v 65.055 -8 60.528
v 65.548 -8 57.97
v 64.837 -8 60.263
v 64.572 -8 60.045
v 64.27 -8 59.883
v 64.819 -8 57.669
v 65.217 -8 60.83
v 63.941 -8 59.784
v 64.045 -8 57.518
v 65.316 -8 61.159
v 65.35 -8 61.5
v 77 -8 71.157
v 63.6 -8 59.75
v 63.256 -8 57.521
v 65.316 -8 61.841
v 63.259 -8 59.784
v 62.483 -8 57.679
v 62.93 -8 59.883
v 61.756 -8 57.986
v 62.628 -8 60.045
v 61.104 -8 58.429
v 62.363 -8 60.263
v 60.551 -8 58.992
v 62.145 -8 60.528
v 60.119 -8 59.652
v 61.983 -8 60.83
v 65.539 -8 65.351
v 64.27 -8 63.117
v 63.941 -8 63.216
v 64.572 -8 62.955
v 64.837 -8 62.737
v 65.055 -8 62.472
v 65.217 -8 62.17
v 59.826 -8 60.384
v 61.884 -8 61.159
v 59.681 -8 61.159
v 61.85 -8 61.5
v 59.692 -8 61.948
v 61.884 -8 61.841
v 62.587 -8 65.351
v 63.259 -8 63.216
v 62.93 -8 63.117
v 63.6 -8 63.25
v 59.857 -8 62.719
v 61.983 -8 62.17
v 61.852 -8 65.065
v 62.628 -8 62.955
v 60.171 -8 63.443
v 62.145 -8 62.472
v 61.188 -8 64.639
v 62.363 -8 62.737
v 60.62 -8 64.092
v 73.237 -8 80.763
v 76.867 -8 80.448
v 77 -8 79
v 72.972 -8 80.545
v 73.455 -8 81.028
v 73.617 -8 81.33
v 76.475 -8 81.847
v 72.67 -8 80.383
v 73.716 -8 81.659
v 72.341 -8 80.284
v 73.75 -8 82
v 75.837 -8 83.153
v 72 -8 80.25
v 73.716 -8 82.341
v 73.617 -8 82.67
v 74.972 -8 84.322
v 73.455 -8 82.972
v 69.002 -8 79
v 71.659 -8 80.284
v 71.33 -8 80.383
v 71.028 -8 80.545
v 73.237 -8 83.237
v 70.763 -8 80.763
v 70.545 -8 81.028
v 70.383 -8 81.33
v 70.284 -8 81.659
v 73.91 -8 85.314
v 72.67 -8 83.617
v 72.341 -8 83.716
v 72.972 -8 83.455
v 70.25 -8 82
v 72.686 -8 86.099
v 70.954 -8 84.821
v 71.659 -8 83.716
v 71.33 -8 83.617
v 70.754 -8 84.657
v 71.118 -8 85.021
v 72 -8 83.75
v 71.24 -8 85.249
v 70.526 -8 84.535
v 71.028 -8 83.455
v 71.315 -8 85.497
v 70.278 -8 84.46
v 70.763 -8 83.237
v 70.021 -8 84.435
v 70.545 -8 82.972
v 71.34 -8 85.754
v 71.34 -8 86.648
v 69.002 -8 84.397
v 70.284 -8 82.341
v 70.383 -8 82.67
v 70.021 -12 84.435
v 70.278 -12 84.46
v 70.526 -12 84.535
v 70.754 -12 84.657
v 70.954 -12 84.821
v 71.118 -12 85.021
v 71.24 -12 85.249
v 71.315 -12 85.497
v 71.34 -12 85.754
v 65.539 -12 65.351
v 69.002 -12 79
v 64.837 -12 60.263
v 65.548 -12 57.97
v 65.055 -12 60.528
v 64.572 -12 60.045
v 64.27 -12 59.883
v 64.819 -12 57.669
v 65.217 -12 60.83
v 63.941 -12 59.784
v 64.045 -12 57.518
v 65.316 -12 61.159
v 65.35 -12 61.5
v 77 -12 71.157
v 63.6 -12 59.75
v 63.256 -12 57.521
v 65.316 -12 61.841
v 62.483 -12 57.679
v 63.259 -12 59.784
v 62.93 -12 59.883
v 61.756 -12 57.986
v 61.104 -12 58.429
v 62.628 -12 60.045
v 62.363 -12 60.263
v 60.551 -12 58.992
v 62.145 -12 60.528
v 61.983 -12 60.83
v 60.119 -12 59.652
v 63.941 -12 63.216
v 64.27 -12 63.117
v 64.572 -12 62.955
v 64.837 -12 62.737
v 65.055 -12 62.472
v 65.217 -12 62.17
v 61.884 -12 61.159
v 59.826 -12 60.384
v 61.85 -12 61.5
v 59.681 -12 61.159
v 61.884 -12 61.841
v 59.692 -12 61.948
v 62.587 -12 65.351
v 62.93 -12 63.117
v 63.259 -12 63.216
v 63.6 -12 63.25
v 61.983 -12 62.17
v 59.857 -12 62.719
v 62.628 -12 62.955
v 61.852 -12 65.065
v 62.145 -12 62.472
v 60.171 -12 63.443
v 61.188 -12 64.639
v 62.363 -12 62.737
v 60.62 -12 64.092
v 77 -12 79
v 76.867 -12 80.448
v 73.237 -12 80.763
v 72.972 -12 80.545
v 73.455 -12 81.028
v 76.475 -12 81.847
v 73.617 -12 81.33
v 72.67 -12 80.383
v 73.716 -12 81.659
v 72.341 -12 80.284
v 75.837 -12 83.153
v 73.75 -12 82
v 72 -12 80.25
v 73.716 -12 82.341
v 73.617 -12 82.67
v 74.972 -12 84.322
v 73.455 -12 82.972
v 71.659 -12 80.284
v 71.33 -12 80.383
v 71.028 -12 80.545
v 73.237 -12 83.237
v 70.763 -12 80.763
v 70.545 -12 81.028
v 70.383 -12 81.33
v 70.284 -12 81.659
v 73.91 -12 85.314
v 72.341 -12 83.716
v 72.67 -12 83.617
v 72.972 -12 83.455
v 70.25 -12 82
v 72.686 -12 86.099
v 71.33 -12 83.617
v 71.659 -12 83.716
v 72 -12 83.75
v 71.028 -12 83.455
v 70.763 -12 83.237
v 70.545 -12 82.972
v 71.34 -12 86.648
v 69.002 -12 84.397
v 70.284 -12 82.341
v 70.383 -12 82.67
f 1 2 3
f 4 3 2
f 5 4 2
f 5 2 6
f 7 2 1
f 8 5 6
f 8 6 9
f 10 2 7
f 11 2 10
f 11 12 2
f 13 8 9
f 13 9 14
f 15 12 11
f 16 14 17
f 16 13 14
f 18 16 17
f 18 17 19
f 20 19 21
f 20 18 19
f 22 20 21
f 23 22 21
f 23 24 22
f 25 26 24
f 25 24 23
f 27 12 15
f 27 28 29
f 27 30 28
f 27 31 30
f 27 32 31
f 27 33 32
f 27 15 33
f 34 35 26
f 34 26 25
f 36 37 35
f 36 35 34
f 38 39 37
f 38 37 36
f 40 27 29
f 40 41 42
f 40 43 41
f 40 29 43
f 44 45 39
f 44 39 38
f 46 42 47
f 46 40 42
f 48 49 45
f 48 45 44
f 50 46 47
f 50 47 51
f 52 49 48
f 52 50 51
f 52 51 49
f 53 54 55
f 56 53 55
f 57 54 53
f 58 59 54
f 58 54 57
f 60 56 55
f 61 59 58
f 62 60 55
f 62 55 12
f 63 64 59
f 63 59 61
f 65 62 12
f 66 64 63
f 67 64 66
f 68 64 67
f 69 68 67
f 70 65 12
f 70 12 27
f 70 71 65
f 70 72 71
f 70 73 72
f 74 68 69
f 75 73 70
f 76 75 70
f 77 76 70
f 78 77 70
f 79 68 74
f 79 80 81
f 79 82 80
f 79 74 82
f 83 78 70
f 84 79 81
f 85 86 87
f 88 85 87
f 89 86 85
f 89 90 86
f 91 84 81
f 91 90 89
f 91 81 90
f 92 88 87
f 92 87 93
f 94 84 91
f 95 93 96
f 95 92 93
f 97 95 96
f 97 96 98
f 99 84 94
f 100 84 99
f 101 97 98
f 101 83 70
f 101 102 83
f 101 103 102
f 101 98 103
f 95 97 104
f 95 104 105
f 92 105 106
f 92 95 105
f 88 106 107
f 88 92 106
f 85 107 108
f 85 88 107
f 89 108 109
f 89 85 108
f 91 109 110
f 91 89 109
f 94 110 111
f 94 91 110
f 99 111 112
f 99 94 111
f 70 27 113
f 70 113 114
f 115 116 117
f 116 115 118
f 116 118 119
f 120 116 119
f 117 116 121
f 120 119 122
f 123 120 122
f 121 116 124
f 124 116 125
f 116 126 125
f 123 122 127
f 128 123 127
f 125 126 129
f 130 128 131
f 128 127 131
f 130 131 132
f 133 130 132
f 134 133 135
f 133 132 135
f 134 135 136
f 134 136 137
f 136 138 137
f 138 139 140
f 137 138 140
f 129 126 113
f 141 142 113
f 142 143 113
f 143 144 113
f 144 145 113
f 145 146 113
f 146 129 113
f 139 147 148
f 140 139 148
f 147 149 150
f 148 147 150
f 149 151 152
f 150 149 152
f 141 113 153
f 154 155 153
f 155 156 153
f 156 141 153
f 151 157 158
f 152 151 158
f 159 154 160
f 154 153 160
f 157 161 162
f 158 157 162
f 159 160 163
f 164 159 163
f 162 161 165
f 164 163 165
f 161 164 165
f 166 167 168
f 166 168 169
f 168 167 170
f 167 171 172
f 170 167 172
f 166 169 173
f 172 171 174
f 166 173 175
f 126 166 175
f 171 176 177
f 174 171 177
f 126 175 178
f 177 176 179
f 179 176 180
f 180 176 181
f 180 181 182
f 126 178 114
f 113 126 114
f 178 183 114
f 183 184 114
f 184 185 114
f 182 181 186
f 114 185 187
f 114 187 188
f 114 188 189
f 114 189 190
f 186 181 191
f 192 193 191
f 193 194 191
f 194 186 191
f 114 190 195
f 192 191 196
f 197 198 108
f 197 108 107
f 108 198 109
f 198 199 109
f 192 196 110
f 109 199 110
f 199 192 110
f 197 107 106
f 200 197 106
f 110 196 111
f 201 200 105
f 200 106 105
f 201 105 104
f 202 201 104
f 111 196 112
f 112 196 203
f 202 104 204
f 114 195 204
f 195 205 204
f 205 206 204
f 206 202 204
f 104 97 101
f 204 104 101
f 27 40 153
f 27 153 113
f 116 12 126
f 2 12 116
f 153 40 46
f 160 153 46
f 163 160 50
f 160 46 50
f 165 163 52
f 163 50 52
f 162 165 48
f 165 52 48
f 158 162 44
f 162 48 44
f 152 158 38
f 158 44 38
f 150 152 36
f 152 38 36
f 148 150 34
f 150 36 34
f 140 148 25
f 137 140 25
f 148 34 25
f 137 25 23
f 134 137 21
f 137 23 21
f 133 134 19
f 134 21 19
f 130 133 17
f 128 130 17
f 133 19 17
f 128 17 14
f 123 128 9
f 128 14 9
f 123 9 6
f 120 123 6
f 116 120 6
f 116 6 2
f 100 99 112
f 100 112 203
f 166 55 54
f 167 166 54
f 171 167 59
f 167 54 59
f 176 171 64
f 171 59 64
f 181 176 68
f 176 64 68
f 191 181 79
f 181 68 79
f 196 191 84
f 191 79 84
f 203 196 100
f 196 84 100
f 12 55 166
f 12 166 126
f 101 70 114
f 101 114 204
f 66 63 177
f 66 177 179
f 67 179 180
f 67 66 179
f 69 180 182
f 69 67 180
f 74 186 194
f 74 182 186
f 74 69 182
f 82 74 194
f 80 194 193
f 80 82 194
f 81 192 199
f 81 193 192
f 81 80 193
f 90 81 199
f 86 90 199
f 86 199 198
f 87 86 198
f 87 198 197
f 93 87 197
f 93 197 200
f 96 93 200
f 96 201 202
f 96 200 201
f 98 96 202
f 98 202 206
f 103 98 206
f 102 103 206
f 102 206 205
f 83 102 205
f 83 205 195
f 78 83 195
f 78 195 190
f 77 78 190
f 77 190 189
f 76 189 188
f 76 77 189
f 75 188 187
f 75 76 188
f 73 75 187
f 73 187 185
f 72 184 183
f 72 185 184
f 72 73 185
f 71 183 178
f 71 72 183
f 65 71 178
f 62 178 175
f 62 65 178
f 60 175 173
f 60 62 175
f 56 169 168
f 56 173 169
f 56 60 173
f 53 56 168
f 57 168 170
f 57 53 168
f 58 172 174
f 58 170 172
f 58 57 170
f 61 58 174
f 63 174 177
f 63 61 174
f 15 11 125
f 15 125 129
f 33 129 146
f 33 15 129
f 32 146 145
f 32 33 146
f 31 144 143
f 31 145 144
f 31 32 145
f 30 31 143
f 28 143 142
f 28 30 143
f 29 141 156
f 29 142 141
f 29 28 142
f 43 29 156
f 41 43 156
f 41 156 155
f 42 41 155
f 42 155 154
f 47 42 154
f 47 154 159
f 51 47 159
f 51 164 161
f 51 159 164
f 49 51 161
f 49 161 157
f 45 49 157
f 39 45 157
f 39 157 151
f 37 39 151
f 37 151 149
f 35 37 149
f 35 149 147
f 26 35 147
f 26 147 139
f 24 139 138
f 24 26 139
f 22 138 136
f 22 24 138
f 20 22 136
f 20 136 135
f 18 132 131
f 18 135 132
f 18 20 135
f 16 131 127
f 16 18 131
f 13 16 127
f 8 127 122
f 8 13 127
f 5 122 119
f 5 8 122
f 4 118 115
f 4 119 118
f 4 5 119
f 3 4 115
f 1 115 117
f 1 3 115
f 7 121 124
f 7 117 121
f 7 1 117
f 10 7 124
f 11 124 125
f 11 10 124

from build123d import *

# Parameters (mm, degrees)
CYLINDER056_R     = 1.75
CYLINDER056_DEPTH = 15
CYLINDER049_R     = 1.75
CYLINDER049_DEPTH = 15
EXTRUDE002_DEPTH  = 4


with BuildPart() as m3holds024:
    # Cylinder056 → Cylinder056 (new body)
    with BuildSketch(Plane(origin=(72, 0.25, 82), x_dir=(1, 0, 0), z_dir=(0, -1, 0))):
        Circle(CYLINDER056_R)
    extrude(amount=CYLINDER056_DEPTH)


with BuildPart() as fusion062:
    # Cylinder049 → Cylinder049 (new body)
    with BuildSketch(Plane(origin=(63.6, 0.25, 61.5), x_dir=(1, 0, 0), z_dir=(0, -1, 0))):
        Circle(CYLINDER049_R)
    extrude(amount=CYLINDER049_DEPTH)

    # Fusion062: union m3Holds024
    add(m3holds024.part)


with BuildPart() as c4holdtopright:
    # Sketch004 → Extrude002 (new body)
    with BuildSketch(Plane.XZ):
        with BuildLine():
            Line((62.586749, 65.351379), (65.538803, 65.351379))
            Line((65.538803, 65.351379), (69.00193, 79))
            Line((69.00193, 79), (69.00193, 84.396622))
            Line((70.021072, 84.435017), (69.00193, 84.396622))
            ThreePointArc((70.021072, 84.435017), (70.953835, 84.821381), (71.340198, 85.754143))
            Line((71.340198, 85.754143), (71.340198, 86.648129))
            ThreePointArc((76.999515, 79), (75.430844, 83.757146), (71.340198, 86.648129))
            Line((76.999515, 79), (76.999515, 71.156998))
            Line((76.999515, 71.156998), (65.547958, 57.96986))
            ThreePointArc((62.586749, 65.351379), (59.954558, 60.010709), (65.547958, 57.96986))
        make_face()
    extrude(amount=EXTRUDE002_DEPTH)


with BuildPart() as c4holdtopright_1:
    # Extrude002 placement: moved
    add(c4holdtopright.part.moved(Location((0, -8, 0))))

    # Cut012: cut Fusion062
    add(fusion062.part, mode=Mode.SUBTRACT)


solid = c4holdtopright_1.part
